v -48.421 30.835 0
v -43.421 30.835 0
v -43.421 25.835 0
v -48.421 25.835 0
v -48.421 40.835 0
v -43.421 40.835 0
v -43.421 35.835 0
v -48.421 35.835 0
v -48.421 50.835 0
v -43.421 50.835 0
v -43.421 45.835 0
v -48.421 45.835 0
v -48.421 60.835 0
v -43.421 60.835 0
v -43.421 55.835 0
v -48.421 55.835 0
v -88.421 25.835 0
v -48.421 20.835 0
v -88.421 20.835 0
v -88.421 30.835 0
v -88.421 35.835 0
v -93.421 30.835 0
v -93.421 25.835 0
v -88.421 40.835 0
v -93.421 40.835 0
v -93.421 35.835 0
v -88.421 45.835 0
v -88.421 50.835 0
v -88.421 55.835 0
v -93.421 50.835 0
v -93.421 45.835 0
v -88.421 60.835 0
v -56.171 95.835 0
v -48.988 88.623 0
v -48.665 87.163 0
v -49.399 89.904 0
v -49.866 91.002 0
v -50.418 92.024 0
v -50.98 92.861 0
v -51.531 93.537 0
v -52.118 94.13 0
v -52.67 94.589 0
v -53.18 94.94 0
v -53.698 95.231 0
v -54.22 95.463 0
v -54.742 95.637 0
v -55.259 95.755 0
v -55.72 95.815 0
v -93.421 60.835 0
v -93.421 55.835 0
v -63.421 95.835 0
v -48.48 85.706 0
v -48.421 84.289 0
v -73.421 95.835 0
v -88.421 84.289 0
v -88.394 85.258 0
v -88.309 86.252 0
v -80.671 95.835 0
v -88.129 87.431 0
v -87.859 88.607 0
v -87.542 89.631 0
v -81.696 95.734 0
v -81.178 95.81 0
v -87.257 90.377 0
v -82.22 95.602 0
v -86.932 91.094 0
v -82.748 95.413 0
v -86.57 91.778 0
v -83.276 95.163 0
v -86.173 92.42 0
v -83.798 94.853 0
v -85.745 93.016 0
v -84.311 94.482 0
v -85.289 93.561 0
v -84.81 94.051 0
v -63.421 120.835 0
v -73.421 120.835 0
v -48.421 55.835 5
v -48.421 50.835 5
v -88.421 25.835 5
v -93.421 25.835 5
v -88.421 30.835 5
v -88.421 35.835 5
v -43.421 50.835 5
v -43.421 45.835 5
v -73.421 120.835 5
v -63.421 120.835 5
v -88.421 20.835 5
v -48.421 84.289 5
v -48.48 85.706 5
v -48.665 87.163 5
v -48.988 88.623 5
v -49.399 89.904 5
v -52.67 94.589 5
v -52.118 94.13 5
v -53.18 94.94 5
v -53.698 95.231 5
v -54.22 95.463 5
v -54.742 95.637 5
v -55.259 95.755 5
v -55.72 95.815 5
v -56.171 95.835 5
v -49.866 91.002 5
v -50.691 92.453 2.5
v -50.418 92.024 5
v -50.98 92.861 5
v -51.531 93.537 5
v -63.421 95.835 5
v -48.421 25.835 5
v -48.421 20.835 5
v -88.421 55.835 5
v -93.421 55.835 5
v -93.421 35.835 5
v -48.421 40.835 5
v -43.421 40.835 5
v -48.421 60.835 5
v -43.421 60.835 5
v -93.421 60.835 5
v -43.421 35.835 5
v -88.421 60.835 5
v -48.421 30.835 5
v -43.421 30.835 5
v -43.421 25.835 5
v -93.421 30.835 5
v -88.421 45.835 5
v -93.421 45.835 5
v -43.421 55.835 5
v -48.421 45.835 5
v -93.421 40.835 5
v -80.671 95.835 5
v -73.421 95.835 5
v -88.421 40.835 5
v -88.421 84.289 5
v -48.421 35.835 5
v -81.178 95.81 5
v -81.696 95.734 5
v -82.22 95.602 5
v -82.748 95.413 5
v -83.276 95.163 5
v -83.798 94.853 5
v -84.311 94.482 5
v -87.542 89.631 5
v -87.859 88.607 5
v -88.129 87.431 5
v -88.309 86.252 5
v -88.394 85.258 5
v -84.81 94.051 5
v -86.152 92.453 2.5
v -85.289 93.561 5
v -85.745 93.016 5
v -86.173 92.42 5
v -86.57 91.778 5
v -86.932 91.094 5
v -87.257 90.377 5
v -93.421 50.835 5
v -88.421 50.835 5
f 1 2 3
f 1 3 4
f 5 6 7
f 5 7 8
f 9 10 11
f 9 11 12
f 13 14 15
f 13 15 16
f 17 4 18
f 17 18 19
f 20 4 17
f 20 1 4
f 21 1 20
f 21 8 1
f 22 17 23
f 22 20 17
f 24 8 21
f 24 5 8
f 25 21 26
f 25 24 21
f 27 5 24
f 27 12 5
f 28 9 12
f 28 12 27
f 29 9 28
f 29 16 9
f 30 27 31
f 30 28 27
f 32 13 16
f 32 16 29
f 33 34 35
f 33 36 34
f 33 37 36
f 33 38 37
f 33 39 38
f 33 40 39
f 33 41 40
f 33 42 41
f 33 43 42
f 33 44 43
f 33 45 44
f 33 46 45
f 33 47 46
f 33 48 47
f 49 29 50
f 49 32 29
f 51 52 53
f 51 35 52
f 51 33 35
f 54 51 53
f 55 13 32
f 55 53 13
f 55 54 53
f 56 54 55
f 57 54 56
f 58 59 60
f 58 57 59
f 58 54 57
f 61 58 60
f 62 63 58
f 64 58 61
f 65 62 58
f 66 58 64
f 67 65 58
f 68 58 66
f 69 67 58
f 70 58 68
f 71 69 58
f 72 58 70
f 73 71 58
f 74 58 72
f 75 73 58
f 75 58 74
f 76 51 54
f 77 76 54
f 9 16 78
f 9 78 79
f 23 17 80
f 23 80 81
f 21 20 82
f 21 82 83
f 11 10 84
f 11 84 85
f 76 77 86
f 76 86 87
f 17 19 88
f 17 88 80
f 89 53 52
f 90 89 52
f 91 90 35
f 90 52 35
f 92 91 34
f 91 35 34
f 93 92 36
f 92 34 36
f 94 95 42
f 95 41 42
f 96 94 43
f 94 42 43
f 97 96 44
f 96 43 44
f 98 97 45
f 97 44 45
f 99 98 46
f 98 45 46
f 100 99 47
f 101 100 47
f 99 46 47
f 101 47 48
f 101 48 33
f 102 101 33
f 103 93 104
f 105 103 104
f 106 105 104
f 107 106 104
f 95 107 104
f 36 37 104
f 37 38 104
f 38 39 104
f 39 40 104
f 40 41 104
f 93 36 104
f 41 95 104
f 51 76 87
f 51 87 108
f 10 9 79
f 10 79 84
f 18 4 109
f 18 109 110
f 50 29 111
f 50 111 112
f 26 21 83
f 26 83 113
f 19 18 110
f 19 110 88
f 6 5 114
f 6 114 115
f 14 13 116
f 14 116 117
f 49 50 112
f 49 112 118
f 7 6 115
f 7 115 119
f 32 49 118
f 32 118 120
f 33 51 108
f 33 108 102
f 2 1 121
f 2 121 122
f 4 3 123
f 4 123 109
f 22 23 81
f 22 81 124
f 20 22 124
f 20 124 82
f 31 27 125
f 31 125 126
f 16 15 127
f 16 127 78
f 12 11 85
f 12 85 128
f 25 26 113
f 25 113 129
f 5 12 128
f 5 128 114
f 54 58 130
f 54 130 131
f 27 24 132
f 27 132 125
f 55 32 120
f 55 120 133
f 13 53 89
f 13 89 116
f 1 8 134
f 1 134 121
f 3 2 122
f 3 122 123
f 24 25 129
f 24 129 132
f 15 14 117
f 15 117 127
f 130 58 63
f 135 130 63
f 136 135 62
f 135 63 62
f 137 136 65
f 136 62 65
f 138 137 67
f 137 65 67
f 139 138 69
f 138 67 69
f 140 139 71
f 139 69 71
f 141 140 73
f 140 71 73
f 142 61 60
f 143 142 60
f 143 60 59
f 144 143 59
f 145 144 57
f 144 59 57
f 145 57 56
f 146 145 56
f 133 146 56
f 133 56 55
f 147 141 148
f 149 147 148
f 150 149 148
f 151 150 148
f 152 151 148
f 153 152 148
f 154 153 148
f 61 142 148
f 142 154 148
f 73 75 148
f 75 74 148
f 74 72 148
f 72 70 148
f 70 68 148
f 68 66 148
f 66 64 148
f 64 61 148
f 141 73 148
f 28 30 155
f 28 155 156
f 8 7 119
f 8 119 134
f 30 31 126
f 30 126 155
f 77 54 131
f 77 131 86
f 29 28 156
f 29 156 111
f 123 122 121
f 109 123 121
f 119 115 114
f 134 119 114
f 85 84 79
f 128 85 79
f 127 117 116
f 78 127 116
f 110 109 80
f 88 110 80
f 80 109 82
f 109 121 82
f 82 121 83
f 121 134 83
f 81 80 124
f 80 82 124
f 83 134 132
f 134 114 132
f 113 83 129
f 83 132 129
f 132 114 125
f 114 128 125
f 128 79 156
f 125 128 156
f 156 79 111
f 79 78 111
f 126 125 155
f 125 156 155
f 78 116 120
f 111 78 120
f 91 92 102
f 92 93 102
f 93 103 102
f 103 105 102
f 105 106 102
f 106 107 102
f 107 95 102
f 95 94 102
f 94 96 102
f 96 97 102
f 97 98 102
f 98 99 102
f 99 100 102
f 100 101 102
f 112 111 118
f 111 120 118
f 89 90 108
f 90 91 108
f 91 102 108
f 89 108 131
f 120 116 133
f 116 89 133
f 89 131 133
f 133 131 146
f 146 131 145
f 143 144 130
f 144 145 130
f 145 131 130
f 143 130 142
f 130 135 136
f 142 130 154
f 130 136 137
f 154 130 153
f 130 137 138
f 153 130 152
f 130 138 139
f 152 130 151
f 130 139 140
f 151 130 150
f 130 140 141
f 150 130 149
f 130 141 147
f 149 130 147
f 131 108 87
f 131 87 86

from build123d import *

# Parameters (mm, degrees)
BOSS_EXTRU_1_DEPTH = 5


with BuildPart() as part:
    # Esquisse1 → Boss.-Extru.1 (new body)
    with BuildSketch(Plane.XY):
        with BuildLine():
            Line((-88.421426264, 20.834954052), (-88.421426264, 25.834954052))
            Line((-88.421426264, 25.834954052), (-93.421426264, 25.834954052))
            Line((-93.421426264, 25.834954052), (-93.421426264, 30.834954052))
            Line((-93.421426264, 30.834954052), (-88.421426264, 30.834954052))
            Line((-88.421426264, 30.834954052), (-88.421426264, 35.834954052))
            Line((-88.421426264, 35.834954052), (-93.421426264, 35.834954052))
            Line((-93.421426264, 35.834954052), (-93.421426264, 40.834954052))
            Line((-93.421426264, 40.834954052), (-88.421426264, 40.834954052))
            Line((-88.421426264, 40.834954052), (-88.421426264, 45.834954052))
            Line((-88.421426264, 45.834954052), (-93.421426264, 45.834954052))
            Line((-93.421426264, 45.834954052), (-93.421426264, 50.834954052))
            Line((-93.421426264, 50.834954052), (-88.421426264, 50.834954052))
            Line((-88.421426264, 50.834954052), (-88.421426264, 55.834954052))
            Line((-88.421426264, 55.834954052), (-93.421426264, 55.834954052))
            Line((-93.421426264, 55.834954052), (-93.421426264, 60.834954052))
            Line((-93.421426264, 60.834954052), (-88.421426264, 60.834954052))
            Line((-88.421426264, 60.834954052), (-88.421426264, 84.288786066))
            add(Edge.make_bspline(
                [(-80.671426264, 95.834954052), (-88.421426264, 95.834954052), (-88.421426264, 84.288786066)],
                knots=[3.141592654, 3.141592654, 3.141592654, 4.71238898, 4.71238898, 4.71238898], degree=2, weights=[1, 0.707106781, 1]))
            Line((-80.671426264, 95.834954052), (-73.421426264, 95.834954052))
            Line((-73.421426264, 95.834954052), (-73.421426264, 120.834954052))
            Line((-73.421426264, 120.834954052), (-63.421426264, 120.834954052))
            Line((-63.421426264, 120.834954052), (-63.421426264, 95.834954052))
            Line((-63.421426264, 95.834954052), (-56.171426264, 95.834954052))
            add(Edge.make_bspline(
                [(-48.421426264, 84.288786066), (-48.421426264, 95.834954052), (-56.171426264, 95.834954052)],
                knots=[1.570796327, 1.570796327, 1.570796327, 3.141592654, 3.141592654, 3.141592654], degree=2, weights=[1, 0.707106781, 1]))
            Line((-48.421426264, 84.288786066), (-48.421426264, 60.834954052))
            Line((-48.421426264, 60.834954052), (-43.421426264, 60.834954052))
            Line((-43.421426264, 60.834954052), (-43.421426264, 55.834954052))
            Line((-43.421426264, 55.834954052), (-48.421426264, 55.834954052))
            Line((-48.421426264, 55.834954052), (-48.421426264, 50.834954052))
            Line((-48.421426264, 50.834954052), (-43.421426264, 50.834954052))
            Line((-43.421426264, 50.834954052), (-43.421426264, 45.834954052))
            Line((-43.421426264, 45.834954052), (-48.421426264, 45.834954052))
            Line((-48.421426264, 45.834954052), (-48.421426264, 40.834954052))
            Line((-48.421426264, 40.834954052), (-43.421426264, 40.834954052))
            Line((-43.421426264, 40.834954052), (-43.421426264, 35.834954052))
            Line((-43.421426264, 35.834954052), (-48.421426264, 35.834954052))
            Line((-48.421426264, 35.834954052), (-48.421426264, 30.834954052))
            Line((-48.421426264, 30.834954052), (-43.421426264, 30.834954052))
            Line((-43.421426264, 30.834954052), (-43.421426264, 25.834954052))
            Line((-43.421426264, 25.834954052), (-48.421426264, 25.834954052))
            Line((-48.421426264, 25.834954052), (-48.421426264, 20.834954052))
            Line((-48.421426264, 20.834954052), (-88.421426264, 20.834954052))
        make_face()
    extrude(amount=BOSS_EXTRU_1_DEPTH)


solid = part.part
